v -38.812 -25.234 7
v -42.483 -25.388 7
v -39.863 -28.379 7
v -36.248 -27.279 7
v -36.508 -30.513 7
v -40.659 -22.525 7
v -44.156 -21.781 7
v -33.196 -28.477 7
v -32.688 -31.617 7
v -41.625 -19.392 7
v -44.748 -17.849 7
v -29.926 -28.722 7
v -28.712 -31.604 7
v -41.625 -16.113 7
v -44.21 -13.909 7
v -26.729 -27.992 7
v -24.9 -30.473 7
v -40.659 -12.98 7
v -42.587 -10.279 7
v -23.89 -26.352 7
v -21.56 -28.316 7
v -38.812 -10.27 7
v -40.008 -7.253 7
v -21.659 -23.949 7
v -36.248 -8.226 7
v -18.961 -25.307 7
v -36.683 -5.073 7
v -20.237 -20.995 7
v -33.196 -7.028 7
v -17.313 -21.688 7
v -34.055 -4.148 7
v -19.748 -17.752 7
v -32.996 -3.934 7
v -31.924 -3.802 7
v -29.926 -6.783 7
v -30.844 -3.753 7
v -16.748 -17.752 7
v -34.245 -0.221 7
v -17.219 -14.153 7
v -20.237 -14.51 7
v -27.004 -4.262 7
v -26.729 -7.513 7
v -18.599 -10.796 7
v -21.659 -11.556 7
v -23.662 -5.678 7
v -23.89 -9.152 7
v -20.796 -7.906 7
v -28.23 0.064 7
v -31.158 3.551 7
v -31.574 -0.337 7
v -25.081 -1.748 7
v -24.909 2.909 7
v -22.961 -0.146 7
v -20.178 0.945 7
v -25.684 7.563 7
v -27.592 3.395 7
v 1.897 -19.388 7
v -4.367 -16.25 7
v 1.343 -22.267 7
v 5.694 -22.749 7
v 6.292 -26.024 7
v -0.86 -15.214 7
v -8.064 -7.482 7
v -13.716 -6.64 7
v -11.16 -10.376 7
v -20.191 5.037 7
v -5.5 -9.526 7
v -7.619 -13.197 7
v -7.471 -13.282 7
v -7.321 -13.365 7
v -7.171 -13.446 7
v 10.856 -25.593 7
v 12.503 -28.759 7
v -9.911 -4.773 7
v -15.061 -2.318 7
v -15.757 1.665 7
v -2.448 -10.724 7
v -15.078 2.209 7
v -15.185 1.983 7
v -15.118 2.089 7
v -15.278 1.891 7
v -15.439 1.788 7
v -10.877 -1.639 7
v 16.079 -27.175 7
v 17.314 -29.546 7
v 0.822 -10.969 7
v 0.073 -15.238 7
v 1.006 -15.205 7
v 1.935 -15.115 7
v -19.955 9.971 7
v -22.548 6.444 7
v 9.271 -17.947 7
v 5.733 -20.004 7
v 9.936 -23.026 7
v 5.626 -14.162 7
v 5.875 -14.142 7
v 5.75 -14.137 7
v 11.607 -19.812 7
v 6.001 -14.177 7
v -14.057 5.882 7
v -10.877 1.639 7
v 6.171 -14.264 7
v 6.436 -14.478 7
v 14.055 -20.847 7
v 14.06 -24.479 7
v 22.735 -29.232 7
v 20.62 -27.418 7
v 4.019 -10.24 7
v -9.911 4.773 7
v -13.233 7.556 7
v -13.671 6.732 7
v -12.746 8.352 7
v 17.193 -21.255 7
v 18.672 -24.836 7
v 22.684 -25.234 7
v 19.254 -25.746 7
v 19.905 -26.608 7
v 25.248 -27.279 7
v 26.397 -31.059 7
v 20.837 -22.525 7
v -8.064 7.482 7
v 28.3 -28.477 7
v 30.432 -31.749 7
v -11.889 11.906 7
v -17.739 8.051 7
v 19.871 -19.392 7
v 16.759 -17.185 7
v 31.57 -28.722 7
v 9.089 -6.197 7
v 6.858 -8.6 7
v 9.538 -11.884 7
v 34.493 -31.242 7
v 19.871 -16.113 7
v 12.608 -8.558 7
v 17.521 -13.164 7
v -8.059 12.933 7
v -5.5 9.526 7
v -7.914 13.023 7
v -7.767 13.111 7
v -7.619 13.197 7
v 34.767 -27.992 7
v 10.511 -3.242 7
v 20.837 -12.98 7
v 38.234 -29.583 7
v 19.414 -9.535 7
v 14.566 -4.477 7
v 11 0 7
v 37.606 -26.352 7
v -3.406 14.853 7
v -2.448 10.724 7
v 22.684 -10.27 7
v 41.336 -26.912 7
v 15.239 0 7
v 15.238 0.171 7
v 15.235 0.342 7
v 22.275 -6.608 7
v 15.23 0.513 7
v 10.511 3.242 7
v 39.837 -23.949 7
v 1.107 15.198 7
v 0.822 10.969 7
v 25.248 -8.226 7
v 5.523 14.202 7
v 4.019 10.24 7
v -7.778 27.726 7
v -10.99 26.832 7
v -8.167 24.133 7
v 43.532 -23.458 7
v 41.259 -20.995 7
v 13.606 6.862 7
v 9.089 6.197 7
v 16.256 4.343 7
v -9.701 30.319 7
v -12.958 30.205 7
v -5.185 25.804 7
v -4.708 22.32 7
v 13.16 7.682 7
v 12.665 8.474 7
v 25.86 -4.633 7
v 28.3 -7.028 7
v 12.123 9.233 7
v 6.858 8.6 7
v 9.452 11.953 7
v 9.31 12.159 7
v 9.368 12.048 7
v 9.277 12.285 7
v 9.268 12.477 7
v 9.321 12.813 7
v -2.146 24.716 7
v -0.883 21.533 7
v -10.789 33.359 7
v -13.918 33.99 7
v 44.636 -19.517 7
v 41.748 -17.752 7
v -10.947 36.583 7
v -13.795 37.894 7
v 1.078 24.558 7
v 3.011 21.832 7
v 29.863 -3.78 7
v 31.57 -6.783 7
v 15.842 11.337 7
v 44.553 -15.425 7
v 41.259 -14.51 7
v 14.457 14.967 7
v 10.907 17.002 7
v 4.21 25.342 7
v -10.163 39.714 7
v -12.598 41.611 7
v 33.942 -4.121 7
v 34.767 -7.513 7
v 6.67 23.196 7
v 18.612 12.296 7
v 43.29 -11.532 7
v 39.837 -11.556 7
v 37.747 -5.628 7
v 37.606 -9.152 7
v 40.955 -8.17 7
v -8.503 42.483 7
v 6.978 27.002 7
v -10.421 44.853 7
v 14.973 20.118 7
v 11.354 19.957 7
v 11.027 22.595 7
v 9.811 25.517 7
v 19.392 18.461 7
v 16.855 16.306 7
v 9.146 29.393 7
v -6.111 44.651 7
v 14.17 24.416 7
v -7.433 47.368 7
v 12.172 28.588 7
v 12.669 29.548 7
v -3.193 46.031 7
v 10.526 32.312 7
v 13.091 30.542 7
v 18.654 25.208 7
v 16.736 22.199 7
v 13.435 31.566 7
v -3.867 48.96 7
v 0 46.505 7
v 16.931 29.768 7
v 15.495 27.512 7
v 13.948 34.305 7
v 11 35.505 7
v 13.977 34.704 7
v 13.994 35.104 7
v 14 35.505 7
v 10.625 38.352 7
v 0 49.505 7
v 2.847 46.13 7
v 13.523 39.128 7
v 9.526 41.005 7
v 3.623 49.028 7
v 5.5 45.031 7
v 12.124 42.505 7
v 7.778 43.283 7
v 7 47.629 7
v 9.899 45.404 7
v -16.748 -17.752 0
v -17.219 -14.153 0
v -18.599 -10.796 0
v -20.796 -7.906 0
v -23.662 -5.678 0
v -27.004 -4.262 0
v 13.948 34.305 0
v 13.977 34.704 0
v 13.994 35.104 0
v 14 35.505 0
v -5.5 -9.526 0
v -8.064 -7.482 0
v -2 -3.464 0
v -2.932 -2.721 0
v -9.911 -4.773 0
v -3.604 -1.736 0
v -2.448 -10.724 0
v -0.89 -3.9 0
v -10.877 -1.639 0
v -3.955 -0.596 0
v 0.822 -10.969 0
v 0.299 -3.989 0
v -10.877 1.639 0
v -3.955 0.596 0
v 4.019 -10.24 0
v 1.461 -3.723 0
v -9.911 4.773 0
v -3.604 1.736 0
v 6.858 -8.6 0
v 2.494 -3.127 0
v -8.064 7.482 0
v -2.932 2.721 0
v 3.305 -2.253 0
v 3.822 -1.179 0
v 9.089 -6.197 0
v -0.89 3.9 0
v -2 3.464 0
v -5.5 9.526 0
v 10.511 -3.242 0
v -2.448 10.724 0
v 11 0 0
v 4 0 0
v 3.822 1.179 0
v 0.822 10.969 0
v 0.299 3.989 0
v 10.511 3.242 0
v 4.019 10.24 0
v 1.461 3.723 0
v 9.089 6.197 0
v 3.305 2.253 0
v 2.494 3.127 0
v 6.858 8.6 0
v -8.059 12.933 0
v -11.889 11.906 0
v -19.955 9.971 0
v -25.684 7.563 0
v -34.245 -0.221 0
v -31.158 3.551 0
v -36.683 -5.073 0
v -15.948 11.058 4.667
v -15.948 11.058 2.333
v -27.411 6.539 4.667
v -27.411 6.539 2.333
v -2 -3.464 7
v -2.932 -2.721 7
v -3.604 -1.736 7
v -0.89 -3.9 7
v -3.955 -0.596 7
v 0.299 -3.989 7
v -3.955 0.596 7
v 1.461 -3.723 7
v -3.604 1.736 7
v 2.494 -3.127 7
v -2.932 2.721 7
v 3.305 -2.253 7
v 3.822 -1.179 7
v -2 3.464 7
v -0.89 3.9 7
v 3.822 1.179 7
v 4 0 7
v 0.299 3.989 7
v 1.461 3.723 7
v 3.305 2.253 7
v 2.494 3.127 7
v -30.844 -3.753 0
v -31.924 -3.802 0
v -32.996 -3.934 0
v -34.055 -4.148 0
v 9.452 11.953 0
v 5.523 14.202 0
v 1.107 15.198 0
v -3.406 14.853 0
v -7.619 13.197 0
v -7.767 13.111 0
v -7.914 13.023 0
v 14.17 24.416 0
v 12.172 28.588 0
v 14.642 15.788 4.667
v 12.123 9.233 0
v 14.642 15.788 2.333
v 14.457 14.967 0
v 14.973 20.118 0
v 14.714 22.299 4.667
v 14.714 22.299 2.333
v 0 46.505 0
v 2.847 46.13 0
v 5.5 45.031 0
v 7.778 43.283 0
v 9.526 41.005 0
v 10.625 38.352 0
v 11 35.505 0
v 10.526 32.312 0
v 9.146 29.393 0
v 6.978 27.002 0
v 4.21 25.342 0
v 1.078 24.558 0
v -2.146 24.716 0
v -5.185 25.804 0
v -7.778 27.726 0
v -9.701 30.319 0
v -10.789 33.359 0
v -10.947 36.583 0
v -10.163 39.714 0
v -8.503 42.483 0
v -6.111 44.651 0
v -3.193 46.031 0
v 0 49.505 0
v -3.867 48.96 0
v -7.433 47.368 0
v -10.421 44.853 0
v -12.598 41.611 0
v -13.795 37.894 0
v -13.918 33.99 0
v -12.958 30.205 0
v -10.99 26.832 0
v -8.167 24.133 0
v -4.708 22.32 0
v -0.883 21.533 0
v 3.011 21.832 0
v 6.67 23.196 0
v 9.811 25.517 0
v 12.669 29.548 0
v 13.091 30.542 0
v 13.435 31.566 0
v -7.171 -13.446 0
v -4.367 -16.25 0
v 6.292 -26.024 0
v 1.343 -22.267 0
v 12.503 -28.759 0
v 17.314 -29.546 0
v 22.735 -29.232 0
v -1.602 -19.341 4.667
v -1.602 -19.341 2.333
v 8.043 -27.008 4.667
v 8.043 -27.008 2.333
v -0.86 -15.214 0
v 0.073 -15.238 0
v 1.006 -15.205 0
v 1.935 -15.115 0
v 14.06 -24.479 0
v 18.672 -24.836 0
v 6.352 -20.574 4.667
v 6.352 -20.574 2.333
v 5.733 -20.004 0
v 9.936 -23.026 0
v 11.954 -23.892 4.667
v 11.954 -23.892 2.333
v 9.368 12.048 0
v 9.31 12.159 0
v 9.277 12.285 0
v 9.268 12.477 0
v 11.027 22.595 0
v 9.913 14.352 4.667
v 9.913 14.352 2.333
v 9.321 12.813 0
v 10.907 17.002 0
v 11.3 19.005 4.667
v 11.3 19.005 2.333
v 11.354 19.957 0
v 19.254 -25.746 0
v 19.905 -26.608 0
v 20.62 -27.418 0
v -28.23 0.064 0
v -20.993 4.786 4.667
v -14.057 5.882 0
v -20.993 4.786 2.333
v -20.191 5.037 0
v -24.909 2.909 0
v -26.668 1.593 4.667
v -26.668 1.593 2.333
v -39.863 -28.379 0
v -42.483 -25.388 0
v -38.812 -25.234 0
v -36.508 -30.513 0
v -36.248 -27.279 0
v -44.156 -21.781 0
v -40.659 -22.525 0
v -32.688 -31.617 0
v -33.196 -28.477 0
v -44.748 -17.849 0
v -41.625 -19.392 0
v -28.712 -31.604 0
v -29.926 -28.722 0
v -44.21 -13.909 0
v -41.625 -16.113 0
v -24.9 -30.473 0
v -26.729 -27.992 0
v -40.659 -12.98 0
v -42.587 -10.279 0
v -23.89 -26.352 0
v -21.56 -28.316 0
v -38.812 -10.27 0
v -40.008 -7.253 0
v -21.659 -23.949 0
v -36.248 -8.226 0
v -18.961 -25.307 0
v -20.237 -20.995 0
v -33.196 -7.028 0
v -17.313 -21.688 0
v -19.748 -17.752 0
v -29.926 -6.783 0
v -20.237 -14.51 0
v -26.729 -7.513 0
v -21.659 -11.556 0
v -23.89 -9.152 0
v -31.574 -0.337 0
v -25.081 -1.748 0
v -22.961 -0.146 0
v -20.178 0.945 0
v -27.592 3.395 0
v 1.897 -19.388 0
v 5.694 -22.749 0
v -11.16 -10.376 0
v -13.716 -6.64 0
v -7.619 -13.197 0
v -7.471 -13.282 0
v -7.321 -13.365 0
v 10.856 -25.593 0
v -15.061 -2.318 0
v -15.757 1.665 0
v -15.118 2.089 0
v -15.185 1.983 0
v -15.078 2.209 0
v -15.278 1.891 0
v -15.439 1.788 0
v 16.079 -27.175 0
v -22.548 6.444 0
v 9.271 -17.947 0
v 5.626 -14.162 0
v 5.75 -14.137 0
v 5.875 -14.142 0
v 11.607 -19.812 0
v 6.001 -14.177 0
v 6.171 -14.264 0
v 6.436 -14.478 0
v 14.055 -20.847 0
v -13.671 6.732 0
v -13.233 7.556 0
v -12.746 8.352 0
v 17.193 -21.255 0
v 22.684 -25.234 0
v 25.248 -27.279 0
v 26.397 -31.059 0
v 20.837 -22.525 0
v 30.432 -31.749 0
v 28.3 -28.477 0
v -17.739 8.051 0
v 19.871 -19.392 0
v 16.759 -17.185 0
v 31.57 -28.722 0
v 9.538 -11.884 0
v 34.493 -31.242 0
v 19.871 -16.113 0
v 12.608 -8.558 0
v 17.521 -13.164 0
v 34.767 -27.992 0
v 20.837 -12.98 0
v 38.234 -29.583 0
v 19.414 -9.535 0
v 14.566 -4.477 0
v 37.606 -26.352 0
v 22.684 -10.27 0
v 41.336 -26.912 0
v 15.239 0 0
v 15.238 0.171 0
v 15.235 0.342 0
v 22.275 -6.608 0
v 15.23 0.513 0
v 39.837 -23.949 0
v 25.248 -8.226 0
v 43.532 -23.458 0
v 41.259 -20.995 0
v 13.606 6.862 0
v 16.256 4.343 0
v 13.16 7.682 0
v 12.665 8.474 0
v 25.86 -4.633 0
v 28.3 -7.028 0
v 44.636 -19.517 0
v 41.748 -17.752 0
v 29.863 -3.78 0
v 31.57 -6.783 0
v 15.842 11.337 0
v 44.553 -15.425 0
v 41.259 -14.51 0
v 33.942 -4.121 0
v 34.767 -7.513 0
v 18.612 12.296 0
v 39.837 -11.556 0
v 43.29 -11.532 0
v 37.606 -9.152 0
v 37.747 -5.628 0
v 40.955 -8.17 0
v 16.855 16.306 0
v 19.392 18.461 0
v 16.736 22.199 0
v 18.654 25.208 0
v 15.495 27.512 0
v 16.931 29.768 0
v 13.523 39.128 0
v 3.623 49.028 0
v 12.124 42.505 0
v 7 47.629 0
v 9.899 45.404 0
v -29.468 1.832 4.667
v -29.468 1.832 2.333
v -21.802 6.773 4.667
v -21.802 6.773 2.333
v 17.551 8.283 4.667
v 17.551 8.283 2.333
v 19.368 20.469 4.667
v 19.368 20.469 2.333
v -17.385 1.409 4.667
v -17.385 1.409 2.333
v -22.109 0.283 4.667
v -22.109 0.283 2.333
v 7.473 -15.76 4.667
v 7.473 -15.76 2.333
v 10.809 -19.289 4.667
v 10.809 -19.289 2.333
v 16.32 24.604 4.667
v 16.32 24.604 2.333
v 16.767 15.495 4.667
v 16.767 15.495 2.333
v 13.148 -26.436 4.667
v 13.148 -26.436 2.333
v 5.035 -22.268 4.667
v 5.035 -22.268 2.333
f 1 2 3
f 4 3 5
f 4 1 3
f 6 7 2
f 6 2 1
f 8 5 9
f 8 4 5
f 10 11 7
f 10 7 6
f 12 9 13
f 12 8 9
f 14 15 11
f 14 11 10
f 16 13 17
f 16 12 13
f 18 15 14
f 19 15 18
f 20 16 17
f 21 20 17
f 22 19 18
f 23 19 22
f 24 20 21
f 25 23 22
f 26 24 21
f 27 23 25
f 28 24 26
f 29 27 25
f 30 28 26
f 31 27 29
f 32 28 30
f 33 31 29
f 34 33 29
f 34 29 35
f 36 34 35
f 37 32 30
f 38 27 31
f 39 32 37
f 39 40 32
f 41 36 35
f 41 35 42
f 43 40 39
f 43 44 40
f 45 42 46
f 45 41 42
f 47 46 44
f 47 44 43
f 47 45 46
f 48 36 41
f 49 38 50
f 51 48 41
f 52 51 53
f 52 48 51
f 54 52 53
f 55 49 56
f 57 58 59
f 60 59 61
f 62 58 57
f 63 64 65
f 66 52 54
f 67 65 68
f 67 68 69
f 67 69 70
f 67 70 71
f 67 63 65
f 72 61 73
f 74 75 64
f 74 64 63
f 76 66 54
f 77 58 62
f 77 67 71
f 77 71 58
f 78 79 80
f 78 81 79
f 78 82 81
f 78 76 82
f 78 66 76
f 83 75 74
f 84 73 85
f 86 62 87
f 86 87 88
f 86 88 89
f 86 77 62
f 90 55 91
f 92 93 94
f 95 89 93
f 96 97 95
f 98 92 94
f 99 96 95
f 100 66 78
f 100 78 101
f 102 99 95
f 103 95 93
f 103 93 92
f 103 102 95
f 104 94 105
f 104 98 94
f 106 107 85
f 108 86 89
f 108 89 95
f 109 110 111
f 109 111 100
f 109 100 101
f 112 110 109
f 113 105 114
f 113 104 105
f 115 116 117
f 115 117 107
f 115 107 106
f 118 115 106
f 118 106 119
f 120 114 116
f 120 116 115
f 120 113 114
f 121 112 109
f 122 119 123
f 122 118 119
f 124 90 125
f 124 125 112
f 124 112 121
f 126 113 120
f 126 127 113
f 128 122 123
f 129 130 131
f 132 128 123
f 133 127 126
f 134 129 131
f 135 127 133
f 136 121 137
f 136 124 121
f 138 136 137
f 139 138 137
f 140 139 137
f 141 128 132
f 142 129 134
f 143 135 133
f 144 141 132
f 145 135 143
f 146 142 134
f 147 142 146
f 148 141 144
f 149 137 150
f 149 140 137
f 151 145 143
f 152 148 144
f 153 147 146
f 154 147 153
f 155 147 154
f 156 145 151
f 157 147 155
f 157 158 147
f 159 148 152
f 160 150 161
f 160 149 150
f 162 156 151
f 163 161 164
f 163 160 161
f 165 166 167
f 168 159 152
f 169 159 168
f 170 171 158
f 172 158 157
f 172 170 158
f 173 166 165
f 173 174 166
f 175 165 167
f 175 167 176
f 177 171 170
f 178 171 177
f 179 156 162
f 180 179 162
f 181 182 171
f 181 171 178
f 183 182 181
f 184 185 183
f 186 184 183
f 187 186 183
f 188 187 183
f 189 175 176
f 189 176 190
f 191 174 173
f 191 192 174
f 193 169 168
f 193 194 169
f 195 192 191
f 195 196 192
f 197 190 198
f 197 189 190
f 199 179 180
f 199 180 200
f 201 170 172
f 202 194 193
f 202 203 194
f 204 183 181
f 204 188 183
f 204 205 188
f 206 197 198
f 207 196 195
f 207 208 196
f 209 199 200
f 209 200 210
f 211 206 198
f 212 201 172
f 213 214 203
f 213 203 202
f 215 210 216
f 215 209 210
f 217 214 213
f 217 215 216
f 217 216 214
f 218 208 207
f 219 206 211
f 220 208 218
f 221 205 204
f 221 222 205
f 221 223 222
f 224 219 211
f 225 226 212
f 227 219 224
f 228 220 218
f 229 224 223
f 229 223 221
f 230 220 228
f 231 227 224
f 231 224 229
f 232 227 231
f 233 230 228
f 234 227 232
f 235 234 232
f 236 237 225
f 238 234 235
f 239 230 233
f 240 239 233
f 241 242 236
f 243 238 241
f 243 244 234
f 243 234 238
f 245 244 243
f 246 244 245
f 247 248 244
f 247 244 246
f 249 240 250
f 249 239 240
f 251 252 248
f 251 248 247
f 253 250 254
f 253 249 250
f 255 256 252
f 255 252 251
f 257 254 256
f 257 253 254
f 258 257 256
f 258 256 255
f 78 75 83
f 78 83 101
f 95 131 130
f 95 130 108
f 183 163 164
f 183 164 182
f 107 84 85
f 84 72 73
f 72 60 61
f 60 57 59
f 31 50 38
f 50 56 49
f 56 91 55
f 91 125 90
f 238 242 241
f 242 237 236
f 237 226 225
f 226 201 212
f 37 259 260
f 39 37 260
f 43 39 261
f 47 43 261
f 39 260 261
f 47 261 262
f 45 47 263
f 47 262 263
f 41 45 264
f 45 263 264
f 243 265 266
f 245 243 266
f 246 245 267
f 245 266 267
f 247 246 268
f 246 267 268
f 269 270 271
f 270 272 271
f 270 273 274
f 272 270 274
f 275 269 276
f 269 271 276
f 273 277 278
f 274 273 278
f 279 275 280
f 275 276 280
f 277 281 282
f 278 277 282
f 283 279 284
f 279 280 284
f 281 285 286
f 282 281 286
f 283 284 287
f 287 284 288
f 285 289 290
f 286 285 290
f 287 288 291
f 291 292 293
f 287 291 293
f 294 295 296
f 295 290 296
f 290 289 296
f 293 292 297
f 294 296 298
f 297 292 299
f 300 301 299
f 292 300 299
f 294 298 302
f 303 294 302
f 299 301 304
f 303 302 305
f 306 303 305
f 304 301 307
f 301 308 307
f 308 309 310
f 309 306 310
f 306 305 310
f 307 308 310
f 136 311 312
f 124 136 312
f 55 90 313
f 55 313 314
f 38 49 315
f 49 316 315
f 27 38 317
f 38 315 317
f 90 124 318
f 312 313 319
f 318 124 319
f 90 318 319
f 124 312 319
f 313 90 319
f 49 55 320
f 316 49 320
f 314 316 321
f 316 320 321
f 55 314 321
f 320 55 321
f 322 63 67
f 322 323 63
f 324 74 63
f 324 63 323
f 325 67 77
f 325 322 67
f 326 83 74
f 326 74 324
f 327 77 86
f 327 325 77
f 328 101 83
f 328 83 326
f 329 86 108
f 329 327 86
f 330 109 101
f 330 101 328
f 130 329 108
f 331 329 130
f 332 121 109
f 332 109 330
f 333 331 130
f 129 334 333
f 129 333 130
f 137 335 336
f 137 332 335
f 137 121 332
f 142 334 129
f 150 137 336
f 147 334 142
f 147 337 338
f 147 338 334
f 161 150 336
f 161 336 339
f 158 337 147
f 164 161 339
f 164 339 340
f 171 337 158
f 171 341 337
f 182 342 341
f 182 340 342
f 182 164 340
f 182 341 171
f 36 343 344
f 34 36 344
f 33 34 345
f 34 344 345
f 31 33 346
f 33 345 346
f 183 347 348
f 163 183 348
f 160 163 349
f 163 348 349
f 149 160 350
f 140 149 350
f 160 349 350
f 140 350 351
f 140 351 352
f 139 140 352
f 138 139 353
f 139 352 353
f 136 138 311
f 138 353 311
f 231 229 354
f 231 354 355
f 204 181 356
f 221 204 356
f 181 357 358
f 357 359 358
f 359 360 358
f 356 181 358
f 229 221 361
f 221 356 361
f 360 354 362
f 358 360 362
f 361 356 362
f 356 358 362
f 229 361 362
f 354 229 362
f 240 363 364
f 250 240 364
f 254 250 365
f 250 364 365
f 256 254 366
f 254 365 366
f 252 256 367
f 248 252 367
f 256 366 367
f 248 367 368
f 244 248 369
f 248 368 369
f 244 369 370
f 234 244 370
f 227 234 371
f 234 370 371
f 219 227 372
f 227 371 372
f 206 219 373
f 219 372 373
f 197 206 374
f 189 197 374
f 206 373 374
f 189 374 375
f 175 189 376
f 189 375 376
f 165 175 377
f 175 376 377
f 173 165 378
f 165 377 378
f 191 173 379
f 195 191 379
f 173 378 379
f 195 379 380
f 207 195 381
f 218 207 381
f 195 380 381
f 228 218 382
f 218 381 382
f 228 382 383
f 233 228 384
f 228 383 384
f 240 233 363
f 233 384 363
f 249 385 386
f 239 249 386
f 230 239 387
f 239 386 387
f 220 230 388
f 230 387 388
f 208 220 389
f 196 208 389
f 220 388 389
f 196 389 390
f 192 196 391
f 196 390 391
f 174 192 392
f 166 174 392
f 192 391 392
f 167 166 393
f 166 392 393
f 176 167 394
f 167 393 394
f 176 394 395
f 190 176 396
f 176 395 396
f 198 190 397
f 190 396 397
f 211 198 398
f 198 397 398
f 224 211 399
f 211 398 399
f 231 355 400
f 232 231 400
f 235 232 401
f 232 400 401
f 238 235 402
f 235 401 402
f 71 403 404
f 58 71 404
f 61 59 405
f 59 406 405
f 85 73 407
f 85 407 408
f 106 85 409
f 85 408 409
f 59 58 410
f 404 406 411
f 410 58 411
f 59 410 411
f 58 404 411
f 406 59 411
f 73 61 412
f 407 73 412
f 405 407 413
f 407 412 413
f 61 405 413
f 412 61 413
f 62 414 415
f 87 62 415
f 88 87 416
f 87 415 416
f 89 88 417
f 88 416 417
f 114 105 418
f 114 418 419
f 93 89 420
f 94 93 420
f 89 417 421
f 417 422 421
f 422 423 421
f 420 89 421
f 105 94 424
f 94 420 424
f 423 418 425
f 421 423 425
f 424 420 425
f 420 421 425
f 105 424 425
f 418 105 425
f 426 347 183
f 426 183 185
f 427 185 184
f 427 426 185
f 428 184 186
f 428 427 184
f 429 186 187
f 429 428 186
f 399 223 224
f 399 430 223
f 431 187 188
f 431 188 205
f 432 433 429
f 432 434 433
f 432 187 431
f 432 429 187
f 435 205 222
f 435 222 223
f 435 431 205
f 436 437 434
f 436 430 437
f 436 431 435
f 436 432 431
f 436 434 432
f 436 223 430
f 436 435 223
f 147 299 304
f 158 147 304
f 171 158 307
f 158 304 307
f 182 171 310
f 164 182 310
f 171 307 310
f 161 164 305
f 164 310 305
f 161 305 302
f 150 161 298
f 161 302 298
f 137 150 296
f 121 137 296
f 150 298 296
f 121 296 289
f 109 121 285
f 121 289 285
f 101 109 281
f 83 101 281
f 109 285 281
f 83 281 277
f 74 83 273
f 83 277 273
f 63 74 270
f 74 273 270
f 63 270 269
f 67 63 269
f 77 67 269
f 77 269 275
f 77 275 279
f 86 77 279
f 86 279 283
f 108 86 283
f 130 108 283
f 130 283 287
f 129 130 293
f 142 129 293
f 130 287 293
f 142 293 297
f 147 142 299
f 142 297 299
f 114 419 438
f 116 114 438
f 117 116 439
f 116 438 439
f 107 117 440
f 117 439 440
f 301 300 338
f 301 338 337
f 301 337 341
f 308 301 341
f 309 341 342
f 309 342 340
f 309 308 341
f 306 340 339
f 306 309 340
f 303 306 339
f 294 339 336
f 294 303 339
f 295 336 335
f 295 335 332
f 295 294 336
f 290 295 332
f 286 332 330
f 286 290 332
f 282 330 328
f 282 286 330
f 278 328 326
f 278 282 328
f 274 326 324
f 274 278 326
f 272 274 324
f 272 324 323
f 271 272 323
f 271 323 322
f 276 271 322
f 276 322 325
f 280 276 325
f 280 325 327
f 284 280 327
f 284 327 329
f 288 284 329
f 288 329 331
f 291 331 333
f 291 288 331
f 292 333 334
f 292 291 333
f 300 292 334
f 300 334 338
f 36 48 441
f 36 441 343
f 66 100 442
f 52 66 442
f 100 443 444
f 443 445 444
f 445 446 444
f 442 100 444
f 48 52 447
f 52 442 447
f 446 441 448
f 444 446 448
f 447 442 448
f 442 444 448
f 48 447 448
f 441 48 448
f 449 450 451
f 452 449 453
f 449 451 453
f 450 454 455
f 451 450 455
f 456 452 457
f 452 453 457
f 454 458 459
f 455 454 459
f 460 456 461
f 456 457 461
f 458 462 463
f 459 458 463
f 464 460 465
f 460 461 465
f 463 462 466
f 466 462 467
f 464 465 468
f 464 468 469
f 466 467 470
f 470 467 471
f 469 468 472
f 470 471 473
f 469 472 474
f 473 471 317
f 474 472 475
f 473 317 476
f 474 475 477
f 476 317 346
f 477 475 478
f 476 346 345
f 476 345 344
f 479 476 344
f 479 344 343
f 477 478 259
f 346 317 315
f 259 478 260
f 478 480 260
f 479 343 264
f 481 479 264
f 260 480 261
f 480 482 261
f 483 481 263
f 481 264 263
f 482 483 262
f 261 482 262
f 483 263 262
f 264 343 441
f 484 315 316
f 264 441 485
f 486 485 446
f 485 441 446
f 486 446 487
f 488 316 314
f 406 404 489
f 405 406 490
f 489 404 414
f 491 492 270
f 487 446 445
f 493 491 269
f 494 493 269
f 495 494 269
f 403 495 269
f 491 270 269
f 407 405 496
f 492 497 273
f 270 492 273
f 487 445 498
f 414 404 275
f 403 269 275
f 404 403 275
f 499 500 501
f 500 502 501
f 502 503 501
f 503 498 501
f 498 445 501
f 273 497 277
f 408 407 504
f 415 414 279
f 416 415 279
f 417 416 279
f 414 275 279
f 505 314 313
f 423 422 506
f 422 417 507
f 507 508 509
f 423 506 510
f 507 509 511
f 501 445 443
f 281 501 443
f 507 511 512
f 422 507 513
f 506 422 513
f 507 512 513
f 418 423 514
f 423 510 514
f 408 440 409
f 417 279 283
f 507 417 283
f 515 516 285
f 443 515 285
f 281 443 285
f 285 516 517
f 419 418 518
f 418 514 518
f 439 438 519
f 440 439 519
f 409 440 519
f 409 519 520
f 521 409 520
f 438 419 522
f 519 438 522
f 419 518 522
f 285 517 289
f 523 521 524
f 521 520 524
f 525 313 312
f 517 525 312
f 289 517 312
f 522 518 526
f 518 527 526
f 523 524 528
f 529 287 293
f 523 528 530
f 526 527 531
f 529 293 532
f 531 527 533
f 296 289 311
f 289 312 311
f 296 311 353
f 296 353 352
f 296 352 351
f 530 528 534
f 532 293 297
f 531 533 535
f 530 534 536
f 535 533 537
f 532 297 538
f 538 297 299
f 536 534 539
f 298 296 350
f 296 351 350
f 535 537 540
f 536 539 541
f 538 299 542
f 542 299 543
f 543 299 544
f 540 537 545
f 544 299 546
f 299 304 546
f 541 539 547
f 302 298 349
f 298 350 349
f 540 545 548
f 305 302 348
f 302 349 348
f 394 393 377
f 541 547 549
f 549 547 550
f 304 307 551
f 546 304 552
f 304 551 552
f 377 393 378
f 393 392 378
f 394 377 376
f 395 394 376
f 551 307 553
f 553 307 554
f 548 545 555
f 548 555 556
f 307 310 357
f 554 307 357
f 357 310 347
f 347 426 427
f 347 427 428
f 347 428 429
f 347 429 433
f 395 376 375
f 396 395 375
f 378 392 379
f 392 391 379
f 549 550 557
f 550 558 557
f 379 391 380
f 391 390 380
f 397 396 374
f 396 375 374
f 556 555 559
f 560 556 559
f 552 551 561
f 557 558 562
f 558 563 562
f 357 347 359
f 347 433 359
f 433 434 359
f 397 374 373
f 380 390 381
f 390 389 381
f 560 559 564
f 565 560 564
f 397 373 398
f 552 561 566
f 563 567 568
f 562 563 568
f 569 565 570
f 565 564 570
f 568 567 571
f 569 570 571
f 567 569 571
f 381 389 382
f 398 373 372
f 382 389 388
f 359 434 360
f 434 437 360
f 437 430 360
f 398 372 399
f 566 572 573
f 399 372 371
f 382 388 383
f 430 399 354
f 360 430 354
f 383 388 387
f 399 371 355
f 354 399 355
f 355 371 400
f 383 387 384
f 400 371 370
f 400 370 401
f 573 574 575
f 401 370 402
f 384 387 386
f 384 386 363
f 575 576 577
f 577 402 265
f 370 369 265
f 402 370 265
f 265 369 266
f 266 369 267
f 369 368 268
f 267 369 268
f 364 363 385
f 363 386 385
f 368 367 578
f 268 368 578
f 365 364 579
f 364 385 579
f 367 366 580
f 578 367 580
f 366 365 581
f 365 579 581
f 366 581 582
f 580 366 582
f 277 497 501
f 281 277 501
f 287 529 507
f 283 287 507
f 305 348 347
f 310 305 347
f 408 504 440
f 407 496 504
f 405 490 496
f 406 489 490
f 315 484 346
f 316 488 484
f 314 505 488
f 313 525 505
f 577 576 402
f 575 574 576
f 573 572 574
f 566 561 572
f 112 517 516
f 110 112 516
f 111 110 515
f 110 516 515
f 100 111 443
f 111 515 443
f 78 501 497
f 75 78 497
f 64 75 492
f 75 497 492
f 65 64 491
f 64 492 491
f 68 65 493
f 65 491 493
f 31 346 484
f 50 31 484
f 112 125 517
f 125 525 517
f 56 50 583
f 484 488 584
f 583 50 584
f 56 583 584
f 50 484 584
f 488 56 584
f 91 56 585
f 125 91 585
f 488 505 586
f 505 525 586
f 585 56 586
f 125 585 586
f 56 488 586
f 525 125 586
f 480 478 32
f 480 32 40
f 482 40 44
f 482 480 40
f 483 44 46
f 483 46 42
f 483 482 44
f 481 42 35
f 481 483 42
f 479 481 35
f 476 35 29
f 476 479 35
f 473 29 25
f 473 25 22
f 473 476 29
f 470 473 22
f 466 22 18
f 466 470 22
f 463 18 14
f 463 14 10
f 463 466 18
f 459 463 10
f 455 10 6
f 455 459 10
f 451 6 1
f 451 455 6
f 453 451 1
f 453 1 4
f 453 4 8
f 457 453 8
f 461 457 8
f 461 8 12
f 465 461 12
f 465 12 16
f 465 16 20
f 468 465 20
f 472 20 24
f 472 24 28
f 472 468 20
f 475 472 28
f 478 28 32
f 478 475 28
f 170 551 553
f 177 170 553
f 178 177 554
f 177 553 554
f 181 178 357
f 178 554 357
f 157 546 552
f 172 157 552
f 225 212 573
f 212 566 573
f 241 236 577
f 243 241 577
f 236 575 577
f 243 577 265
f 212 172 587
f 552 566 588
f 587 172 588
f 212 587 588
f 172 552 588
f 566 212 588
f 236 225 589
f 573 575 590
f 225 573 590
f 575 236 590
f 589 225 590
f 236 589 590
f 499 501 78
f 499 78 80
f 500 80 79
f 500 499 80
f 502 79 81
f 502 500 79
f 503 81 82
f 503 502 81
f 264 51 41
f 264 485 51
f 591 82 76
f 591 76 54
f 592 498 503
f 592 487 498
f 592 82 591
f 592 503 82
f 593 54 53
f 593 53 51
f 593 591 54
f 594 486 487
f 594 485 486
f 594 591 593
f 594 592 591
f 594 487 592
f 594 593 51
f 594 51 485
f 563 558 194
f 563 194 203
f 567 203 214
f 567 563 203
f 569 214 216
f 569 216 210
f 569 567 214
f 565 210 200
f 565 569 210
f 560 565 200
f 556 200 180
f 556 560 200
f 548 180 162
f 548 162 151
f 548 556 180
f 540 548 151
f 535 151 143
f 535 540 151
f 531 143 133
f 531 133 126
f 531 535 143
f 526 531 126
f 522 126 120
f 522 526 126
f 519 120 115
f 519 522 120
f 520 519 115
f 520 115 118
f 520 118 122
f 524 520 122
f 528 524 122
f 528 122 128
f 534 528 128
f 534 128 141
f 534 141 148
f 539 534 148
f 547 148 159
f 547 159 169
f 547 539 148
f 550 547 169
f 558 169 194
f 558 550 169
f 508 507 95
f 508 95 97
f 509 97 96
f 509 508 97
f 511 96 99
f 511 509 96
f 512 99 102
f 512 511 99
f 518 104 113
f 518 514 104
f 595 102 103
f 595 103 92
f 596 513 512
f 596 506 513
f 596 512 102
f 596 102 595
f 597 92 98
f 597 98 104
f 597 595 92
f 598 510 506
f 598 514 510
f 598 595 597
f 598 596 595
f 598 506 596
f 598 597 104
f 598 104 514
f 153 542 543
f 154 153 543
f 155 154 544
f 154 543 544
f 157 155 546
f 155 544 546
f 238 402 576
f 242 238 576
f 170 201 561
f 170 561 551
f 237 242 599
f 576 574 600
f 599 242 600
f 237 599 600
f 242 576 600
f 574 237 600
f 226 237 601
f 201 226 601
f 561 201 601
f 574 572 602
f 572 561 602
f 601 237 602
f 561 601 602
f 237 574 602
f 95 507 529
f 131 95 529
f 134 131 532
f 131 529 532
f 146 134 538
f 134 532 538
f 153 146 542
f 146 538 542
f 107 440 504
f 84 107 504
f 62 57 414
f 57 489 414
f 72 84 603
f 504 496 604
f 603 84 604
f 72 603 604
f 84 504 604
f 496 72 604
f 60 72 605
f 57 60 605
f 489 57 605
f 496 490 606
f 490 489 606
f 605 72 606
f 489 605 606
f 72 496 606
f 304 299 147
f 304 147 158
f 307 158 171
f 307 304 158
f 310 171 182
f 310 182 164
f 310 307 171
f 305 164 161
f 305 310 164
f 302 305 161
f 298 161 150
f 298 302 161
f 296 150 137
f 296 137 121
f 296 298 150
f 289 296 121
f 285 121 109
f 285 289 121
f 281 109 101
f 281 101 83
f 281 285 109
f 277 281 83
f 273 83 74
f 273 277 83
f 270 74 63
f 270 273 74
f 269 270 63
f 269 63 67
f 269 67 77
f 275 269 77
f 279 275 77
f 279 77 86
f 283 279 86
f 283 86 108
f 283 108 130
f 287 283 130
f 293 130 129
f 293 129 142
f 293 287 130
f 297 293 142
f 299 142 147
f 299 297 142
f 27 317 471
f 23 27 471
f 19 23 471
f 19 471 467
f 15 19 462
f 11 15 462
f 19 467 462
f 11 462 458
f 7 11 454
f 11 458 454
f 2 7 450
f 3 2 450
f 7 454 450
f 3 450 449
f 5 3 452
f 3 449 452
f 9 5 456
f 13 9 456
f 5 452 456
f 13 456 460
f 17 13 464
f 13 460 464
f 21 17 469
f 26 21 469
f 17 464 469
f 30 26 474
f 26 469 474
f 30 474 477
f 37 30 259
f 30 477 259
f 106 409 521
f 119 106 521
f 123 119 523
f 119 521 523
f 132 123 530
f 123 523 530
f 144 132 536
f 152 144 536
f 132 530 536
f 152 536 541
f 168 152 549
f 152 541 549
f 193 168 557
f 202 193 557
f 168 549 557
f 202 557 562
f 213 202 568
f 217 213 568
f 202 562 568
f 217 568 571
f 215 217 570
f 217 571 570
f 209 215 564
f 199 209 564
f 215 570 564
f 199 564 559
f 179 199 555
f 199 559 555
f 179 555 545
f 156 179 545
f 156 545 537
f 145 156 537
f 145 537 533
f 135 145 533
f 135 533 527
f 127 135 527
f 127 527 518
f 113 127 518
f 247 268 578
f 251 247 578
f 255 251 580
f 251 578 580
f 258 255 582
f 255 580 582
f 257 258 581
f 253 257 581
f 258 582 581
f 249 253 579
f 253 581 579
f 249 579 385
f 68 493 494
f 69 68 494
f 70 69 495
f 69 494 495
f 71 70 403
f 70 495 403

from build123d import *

# Parameters (mm, degrees)
F0_R     = 11
F0_R_2   = 4
F1_DEPTH = 7
F2_DEPTH = 7


with BuildPart() as f1:
    # F0 (on Top) → F1 (new body)
    with BuildSketch(Plane.XY):
        Circle(F0_R)
        Circle(F0_R_2, mode=Mode.SUBTRACT)
    extrude(amount=F1_DEPTH)


with BuildPart() as f2:
    # F0 (on Top) → F2 (new body)
    with BuildSketch(Plane.XY):
        with BuildLine():
            ThreePointArc((14, 35.5046585807), (9.8994949366, 45.4041535174), (0, 49.5046585807))
            ThreePointArc((0, 49.5046585807), (-12.9580703886, 30.2048084128), (9.8108330751, 25.5172888383))
            ThreePointArc((9.8108330751, 25.5172888383), (11.0983257909, 26.9707752537), (12.1723308709, 28.588419634))
            ThreePointArc((12.1723308709, 28.588419634), (12.8897911228, 30.0408426238), (13.4346674784, 31.566421698))
            ThreePointArc((13.4346674784, 31.566421698), (13.7598632413, 32.9227671072), (13.9484835753, 34.3047394379))
            ThreePointArc((13.9484835753, 34.3047394379), (13.9871149644, 34.904146322), (14, 35.5046585807))
        make_face()
        with BuildLine():
            ThreePointArc((11, 35.5046585807), (-7.7781745931, 27.7264839877), (0, 46.5046585807))
            ThreePointArc((0, 46.5046585807), (7.7781745931, 43.2828331738), (11, 35.5046585807))
        make_face(mode=Mode.SUBTRACT)
        with BuildLine():
            ThreePointArc((12.1723308709, 28.588419634), (11.0983257909, 26.9707752537), (9.8108330751, 25.5172888383))
            add(Edge.make_bspline(
                [(9.4517272848, 11.9531855099), (8.1816991863, 13.0922129173), (14.0057700702, 18.2080167226), (9.8108330751, 25.5172888383)],
                knots=[0.1803540845, 0.1803540845, 0.1803540845, 0.1803540845, 13.6112300964, 13.6112300964, 13.6112300964, 13.6112300964], degree=3))
            ThreePointArc((9.4517272848, 11.9531855099), (9.4792735432, 11.9313522115), (9.5067693672, 11.9094554326))
            ThreePointArc((9.5067693672, 11.9094554326), (10.8973285777, 10.6518553487), (12.122925882, 9.2330092906))
            add(Edge.make_bspline(
                [(12.122925882, 9.2330092906), (15.8085282892, 15.7495811582), (16.0773210227, 22.4694218487), (12.1723308709, 28.588419634)],
                knots=[0, 0, 0, 0, 19.3554733968, 19.3554733968, 19.3554733968, 19.3554733968], degree=3))
        make_face()
        with BuildLine():
            add(Edge.make_bspline(
                [(15.2299184457, 0.5132023359), (15.5574350677, 5.1525312386), (25.2311147708, 20.5664775316), (13.9484835753, 34.3047394379)],
                knots=[1.3457221099, 1.3457221099, 1.3457221099, 1.3457221099, 34.3289885081, 34.3289885081, 34.3289885081, 34.3289885081], degree=3))
            ThreePointArc((13.9484835753, 34.3047394379), (13.7598632413, 32.9227671072), (13.4346674784, 31.566421698))
            add(Edge.make_bspline(
                [(13.4346674784, 31.566421698), (17.1492826194, 26.552028954), (18.9610160887, 14.381878078), (13.6060726459, 6.8621118948)],
                knots=[0, 0, 0, 0, 24.7049044237, 24.7049044237, 24.7049044237, 24.7049044237], degree=3))
            ThreePointArc((13.6060726459, 6.8621118948), (14.7633247849, 3.7759811699), (15.2299184457, 0.5132023359))
        make_face()
        with BuildLine():
            add(Edge.make_bspline(
                [(9.5067693672, 11.9094554326), (9.4871151753, 11.923312155), (9.468781627, 11.9378902868), (9.4517272848, 11.9531855099)],
                knots=[0, 0, 0, 0, 0.1803540845, 0.1803540845, 0.1803540845, 0.1803540845], degree=3))
            ThreePointArc((9.4517272848, 11.9531855099), (1.1073491815, 15.1982752407), (-7.6192813392, 13.1969823966))
            add(Edge.make_bspline(
                [(-7.6192813392, 13.1969823966), (-7.7415030756, 13.1035412064), (-7.8887982414, 13.0159652933), (-8.059405483, 12.9328951036)],
                knots=[0, 0, 0, 0, 1.3457221099, 1.3457221099, 1.3457221099, 1.3457221099], degree=3))
            ThreePointArc((-8.059405483, 12.9328951036), (-10.6517580098, 10.8974237231), (-12.7457995474, 8.3521486097))
            ThreePointArc((-12.7457995474, 8.3521486097), (-13.458420674, 7.1473565367), (-14.05748354, 5.8822571367))
            ThreePointArc((-14.05748354, 5.8822571367), (-14.6734416183, 4.1114357074), (-15.0672756334, 2.2783760636))
            add(Edge.make_bspline(
                [(-15.0672756334, 2.2783760636), (-15.0694488111, 2.2544266729), (-15.0729070695, 2.2312602885), (-15.0776259502, 2.2088431833)],
                knots=[0, 0, 0, 0, 0.1803540845, 0.1803540845, 0.1803540845, 0.1803540845], degree=3))
            ThreePointArc((-15.0776259502, 2.2088431833), (-13.7157670429, -6.6401450983), (-7.6192813392, -13.1969823966))
            add(Edge.make_bspline(
                [(-7.6192813392, -13.1969823966), (-7.4772480265, -13.2561089301), (-7.3277574781, -13.339882329), (-7.1705129627, -13.4460974395)],
                knots=[0, 0, 0, 0, 1.3457221099, 1.3457221099, 1.3457221099, 1.3457221099], degree=3))
            ThreePointArc((-7.1705129627, -13.4460974395), (-4.1115667751, -14.673404893), (-0.8602730984, -15.2142605045))
            ThreePointArc((-0.8602730984, -15.2142605045), (0.5394180063, -15.2290124669), (1.934557658, -15.1152664273))
            ThreePointArc((1.934557658, -15.1152664273), (3.7761130406, -14.7632910561), (5.5605062662, -14.1878314962))
            add(Edge.make_bspline(
                [(5.5605062662, -14.1878314962), (5.5823336358, -14.1777388279), (5.6041254425, -14.1691505753), (5.6258986653, -14.1620286933)],
                knots=[0, 0, 0, 0, 0.1803540845, 0.1803540845, 0.1803540845, 0.1803540845], degree=3))
            ThreePointArc((5.6258986653, -14.1620286933), (12.6084178614, -8.5581301424), (15.2385626783, 0))
            add(Edge.make_bspline(
                [(15.2385626783, 0), (15.2187511021, 0.1525677237), (15.2165557195, 0.3239170357), (15.2299184457, 0.5132023359)],
                knots=[0, 0, 0, 0, 1.3457221099, 1.3457221099, 1.3457221099, 1.3457221099], degree=3))
            ThreePointArc((15.2299184457, 0.5132023359), (14.7633247849, 3.7759811699), (13.6060726459, 6.8621118948))
            ThreePointArc((13.6060726459, 6.8621118948), (12.9190026677, 8.0816559302), (12.122925882, 9.2330092906))
            ThreePointArc((12.122925882, 9.2330092906), (10.8973285777, 10.6518553487), (9.5067693672, 11.9094554326))
        make_face()
        Circle(F0_R, mode=Mode.SUBTRACT)
        with BuildLine():
            ThreePointArc((9.5067693672, 11.9094554326), (9.4792735432, 11.9313522115), (9.4517272848, 11.9531855099))
            add(Edge.make_bspline(
                [(9.5067693672, 11.9094554326), (9.4871151753, 11.923312155), (9.468781627, 11.9378902868), (9.4517272848, 11.9531855099)],
                knots=[0, 0, 0, 0, 0.1803540845, 0.1803540845, 0.1803540845, 0.1803540845], degree=3))
        make_face()
        with BuildLine():
            ThreePointArc((15.2385626783, 0), (15.2364014669, 0.2566375656), (15.2299184457, 0.5132023359))
            add(Edge.make_bspline(
                [(15.2385626783, 0), (15.2187511021, 0.1525677237), (15.2165557195, 0.3239170357), (15.2299184457, 0.5132023359)],
                knots=[0, 0, 0, 0, 1.3457221099, 1.3457221099, 1.3457221099, 1.3457221099], degree=3))
        make_face()
        with BuildLine():
            add(Edge.make_bspline(
                [(-7.6192813392, 13.1969823966), (-7.7415030756, 13.1035412064), (-7.8887982414, 13.0159652933), (-8.059405483, 12.9328951036)],
                knots=[0, 0, 0, 0, 1.3457221099, 1.3457221099, 1.3457221099, 1.3457221099], degree=3))
            ThreePointArc((-7.6192813392, 13.1969823966), (-7.8404553848, 13.0667919498), (-8.059405483, 12.9328951036))
        make_face()
        with BuildLine():
            ThreePointArc((-12.7457995474, 8.3521486097), (-10.6517580098, 10.8974237231), (-8.059405483, 12.9328951036))
            add(Edge.make_bspline(
                [(-8.059405483, 12.9328951036), (-12.2409404802, 10.896868367), (-30.4266493942, 11.5675475915), (-36.683017611, -5.0726285984)],
                knots=[1.3457221099, 1.3457221099, 1.3457221099, 1.3457221099, 34.3289885081, 34.3289885081, 34.3289885081, 34.3289885081], degree=3))
            ThreePointArc((-36.683017611, -5.0726285984), (-35.3918842983, -4.544992434), (-34.0546568363, -4.1484475213))
            add(Edge.make_bspline(
                [(-34.0546568363, -4.1484475213), (-31.5693729059, 1.575699928), (-21.935579814, 9.2297825754), (-12.7457995474, 8.3521486097)],
                knots=[0, 0, 0, 0, 24.7049044237, 24.7049044237, 24.7049044237, 24.7049044237], degree=3))
        make_face()
        with BuildLine():
            add(Edge.make_bspline(
                [(5.6258986653, -14.1620286933), (7.247339385, -13.6316658001), (8.7657199992, -21.2333610417), (17.1932038321, -21.2550750945)],
                knots=[0.1803540845, 0.1803540845, 0.1803540845, 0.1803540845, 13.6112300964, 13.6112300964, 13.6112300964, 13.6112300964], degree=3))
            ThreePointArc((5.6258986653, -14.1620286933), (5.5932173451, -14.1749678036), (5.5605062662, -14.1878314962))
            ThreePointArc((5.5605062662, -14.1878314962), (3.7761130406, -14.7632910561), (1.934557658, -15.1152664273))
            add(Edge.make_bspline(
                [(1.934557658, -15.1152664273), (5.7352732373, -21.565377674), (11.4204296179, -25.1580793548), (18.6721322216, -24.8357575745)],
                knots=[0, 0, 0, 0, 19.3554733968, 19.3554733968, 19.3554733968, 19.3554733968], degree=3))
            ThreePointArc((18.6721322216, -24.8357575745), (17.808213634, -23.0968197012), (17.1932038321, -21.2550750945))
        make_face()
        with BuildLine():
            ThreePointArc((5.5605062662, -14.1878314962), (5.5932173451, -14.1749678036), (5.6258986653, -14.1620286933))
            add(Edge.make_bspline(
                [(5.5605062662, -14.1878314962), (5.5823336358, -14.1777388279), (5.6041254425, -14.1691505753), (5.6258986653, -14.1620286933)],
                knots=[0, 0, 0, 0, 0.1803540845, 0.1803540845, 0.1803540845, 0.1803540845], degree=3))
        make_face()
        with BuildLine():
            ThreePointArc((-34.0546568363, -4.1484475213), (-35.3918842983, -4.544992434), (-36.683017611, -5.0726285984))
            ThreePointArc((-36.683017611, -5.0726285984), (-38.2615526372, -29.5652700458), (-16.7479362836, -17.7523292904))
            ThreePointArc((-16.7479362836, -17.7523292904), (-19.603103596, -9.2792717333), (-27.0040369072, -4.2622137438))
            ThreePointArc((-27.0040369072, -4.2622137438), (-28.9065394249, -3.8739555525), (-30.8444630925, -3.7526620595))
            ThreePointArc((-30.8444630925, -3.7526620595), (-32.4610284247, -3.8575347501), (-34.0546568363, -4.1484475213))
        make_face()
        with Locations((-30.7479362836, -17.7523292904)):
            Circle(F0_R, mode=Mode.SUBTRACT)
        with BuildLine():
            ThreePointArc((44.7479362836, -17.7523292904), (28.9824695353, -3.8640922834), (17.1932038321, -21.2550750945))
            ThreePointArc((17.1932038321, -21.2550750945), (17.808213634, -23.0968197012), (18.6721322216, -24.8357575745))
            ThreePointArc((18.6721322216, -24.8357575745), (19.5712373019, -26.1833078737), (20.6199893579, -27.4179741767))
            ThreePointArc((20.6199893579, -27.4179741767), (21.6320210571, -28.3777746731), (22.7345340357, -29.2321108394))
            ThreePointArc((22.7345340357, -29.2321108394), (37.2214348945, -30.1657823045), (44.7479362836, -17.7523292904))
        make_face()
        with Locations((30.7479362836, -17.7523292904)):
            Circle(F0_R, mode=Mode.SUBTRACT)
        with BuildLine():
            ThreePointArc((-15.0672756334, 2.2783760636), (-14.6734416183, 4.1114357074), (-14.05748354, 5.8822571367))
            add(Edge.make_bspline(
                [(-14.05748354, 5.8822571367), (-21.5438015265, 5.8157965158), (-27.4977506407, 2.6886575062), (-30.8444630925, -3.7526620595)],
                knots=[0, 0, 0, 0, 19.3554733968, 19.3554733968, 19.3554733968, 19.3554733968], degree=3))
            ThreePointArc((-30.8444630925, -3.7526620595), (-28.9065394249, -3.8739555525), (-27.0040369072, -4.2622137438))
            add(Edge.make_bspline(
                [(-15.0776259502, 2.2088431833), (-15.4290385713, 0.5394528828), (-22.7714900694, 3.025344319), (-27.0040369072, -4.2622137438)],
                knots=[0.1803540845, 0.1803540845, 0.1803540845, 0.1803540845, 13.6112300964, 13.6112300964, 13.6112300964, 13.6112300964], degree=3))
            ThreePointArc((-15.0776259502, 2.2088431833), (-15.0724908883, 2.243615592), (-15.0672756334, 2.2783760636))
        make_face()
        with BuildLine():
            add(Edge.make_bspline(
                [(-15.0672756334, 2.2783760636), (-15.0694488111, 2.2544266729), (-15.0729070695, 2.2312602885), (-15.0776259502, 2.2088431833)],
                knots=[0, 0, 0, 0, 0.1803540845, 0.1803540845, 0.1803540845, 0.1803540845], degree=3))
            ThreePointArc((-15.0672756334, 2.2783760636), (-15.0724908883, 2.243615592), (-15.0776259502, 2.2088431833))
        make_face()
        with BuildLine():
            add(Edge.make_bspline(
                [(20.6199893579, -27.4179741767), (14.4200902865, -28.1277288821), (2.9745637253, -23.6116606534), (-0.8602730984, -15.2142605045)],
                knots=[0, 0, 0, 0, 24.7049044237, 24.7049044237, 24.7049044237, 24.7049044237], degree=3))
            ThreePointArc((-0.8602730984, -15.2142605045), (-4.1115667751, -14.673404893), (-7.1705129627, -13.4460974395))
            add(Edge.make_bspline(
                [(-7.1705129627, -13.4460974395), (-3.3164945874, -16.0493996056), (5.1955346233, -32.1340251231), (22.7345340357, -29.2321108394)],
                knots=[1.3457221099, 1.3457221099, 1.3457221099, 1.3457221099, 34.3289885081, 34.3289885081, 34.3289885081, 34.3289885081], degree=3))
            ThreePointArc((22.7345340357, -29.2321108394), (21.6320210571, -28.3777746731), (20.6199893579, -27.4179741767))
        make_face()
        with BuildLine():
            ThreePointArc((-7.6192813392, -13.1969823966), (-7.3959460821, -13.3234295154), (-7.1705129627, -13.4460974395))
            add(Edge.make_bspline(
                [(-7.6192813392, -13.1969823966), (-7.4772480265, -13.2561089301), (-7.3277574781, -13.339882329), (-7.1705129627, -13.4460974395)],
                knots=[0, 0, 0, 0, 1.3457221099, 1.3457221099, 1.3457221099, 1.3457221099], degree=3))
        make_face()
    extrude(amount=F2_DEPTH)


solid = Compound([f1.part, f2.part])
